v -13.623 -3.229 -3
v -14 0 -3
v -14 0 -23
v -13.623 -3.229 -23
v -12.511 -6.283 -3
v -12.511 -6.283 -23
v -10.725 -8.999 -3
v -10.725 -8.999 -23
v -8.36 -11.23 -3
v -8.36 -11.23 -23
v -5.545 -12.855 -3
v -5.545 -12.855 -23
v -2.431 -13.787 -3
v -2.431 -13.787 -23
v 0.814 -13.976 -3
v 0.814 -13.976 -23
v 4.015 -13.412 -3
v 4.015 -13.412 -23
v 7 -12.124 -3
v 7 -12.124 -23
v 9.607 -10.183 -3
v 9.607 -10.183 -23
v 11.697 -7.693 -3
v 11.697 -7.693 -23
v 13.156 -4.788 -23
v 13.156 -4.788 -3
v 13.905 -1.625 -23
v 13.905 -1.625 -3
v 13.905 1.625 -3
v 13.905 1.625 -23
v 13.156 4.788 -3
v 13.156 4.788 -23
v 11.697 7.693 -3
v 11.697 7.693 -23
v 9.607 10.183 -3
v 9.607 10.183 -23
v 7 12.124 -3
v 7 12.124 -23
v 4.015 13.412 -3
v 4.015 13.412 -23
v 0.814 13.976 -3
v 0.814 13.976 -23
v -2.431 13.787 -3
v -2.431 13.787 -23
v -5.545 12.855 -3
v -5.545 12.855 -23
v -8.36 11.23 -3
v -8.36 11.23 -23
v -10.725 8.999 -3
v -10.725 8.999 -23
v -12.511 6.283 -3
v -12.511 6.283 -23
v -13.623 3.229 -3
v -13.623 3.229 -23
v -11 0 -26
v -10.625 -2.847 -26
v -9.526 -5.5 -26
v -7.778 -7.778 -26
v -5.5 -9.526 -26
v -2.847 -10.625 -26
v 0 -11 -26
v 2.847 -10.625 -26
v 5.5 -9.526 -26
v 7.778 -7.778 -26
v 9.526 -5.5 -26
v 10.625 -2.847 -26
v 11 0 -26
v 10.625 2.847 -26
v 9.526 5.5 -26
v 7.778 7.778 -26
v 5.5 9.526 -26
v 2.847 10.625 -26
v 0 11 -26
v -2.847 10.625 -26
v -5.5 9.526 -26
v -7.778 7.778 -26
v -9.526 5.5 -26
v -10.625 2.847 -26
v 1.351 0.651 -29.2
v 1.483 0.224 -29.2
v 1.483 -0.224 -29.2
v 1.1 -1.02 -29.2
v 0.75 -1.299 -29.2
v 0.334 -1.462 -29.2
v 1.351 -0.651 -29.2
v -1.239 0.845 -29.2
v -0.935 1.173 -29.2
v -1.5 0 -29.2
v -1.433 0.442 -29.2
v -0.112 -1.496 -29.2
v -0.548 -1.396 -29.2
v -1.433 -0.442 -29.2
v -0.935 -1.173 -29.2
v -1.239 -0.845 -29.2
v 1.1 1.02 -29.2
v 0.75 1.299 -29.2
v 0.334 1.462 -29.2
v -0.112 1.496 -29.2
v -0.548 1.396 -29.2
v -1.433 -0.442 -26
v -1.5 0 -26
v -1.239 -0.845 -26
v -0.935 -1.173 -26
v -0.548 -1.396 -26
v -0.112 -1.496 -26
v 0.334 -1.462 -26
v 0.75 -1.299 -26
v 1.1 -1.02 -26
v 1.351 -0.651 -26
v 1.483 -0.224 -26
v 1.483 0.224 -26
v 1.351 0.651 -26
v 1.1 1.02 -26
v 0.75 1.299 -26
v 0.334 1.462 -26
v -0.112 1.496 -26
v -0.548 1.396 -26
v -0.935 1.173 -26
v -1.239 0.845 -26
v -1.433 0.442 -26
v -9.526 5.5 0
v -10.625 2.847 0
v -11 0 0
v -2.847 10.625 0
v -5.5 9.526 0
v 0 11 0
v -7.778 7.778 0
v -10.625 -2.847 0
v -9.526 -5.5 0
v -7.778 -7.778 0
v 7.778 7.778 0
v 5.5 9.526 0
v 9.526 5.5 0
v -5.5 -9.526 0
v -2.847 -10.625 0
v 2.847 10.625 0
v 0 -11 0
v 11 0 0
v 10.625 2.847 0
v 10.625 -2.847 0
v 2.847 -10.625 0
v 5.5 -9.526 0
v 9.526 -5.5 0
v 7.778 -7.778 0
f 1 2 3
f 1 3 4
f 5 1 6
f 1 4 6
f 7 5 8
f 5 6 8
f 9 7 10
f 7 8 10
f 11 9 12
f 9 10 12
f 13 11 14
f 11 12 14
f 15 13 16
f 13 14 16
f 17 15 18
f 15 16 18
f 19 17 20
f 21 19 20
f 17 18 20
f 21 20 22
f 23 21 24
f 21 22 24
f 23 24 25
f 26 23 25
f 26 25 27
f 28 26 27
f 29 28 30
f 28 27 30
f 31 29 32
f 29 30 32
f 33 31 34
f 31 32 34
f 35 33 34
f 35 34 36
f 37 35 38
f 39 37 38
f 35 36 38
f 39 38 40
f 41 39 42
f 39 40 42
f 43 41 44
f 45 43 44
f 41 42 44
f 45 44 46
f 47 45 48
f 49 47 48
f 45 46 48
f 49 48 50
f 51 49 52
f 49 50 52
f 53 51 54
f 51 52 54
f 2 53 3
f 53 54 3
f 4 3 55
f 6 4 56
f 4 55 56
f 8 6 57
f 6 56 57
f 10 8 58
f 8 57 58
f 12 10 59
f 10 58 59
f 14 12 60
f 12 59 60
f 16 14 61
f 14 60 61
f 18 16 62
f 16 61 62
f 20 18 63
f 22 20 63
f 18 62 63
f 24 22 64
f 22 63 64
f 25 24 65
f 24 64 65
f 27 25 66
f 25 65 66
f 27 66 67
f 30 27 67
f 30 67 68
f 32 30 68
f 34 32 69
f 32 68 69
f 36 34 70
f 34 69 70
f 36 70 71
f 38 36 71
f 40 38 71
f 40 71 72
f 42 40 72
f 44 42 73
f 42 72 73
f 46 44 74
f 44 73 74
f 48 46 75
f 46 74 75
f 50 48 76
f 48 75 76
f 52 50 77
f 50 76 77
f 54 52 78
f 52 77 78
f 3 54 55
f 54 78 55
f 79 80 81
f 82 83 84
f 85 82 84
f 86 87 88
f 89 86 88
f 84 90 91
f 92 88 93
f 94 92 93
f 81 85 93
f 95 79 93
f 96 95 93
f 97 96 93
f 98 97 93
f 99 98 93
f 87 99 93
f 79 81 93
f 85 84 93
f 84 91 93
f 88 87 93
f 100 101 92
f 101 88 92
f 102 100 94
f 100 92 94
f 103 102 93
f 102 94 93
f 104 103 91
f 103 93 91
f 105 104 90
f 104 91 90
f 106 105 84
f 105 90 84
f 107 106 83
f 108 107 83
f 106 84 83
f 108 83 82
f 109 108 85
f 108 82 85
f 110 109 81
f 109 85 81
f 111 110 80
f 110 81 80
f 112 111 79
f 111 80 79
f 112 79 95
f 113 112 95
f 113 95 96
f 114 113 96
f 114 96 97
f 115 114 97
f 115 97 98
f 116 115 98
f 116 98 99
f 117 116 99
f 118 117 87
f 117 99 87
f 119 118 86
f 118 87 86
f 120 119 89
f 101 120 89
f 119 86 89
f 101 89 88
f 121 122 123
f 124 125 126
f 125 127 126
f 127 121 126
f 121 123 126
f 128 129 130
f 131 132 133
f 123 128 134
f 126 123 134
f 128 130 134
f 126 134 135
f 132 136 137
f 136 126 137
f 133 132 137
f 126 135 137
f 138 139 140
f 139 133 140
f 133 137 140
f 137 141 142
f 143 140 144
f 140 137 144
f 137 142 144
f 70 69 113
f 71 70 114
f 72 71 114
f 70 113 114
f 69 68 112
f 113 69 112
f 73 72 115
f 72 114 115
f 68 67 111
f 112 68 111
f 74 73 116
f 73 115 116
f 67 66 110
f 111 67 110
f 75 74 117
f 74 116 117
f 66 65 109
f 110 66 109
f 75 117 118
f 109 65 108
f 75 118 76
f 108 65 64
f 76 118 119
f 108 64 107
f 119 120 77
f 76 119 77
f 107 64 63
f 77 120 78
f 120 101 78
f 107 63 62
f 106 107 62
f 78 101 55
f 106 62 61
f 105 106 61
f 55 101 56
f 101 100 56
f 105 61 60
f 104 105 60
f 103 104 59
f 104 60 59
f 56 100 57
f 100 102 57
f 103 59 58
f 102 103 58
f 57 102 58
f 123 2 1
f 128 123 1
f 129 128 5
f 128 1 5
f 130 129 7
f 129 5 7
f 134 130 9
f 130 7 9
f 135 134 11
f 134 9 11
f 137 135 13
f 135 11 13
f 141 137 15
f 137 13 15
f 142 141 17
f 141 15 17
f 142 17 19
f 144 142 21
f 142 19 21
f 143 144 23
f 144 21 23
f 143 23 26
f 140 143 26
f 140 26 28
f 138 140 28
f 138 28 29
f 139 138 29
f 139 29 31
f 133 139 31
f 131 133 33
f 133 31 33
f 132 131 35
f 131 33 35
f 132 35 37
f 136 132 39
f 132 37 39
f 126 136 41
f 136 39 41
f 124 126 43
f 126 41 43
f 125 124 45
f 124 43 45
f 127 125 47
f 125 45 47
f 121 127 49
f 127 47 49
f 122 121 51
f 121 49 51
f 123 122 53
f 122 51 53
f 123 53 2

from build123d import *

# Parameters (mm, degrees)
CHAMFER1_SIZE = 3


with BuildPart() as part:
    # Sketch1 → Revolve1 (revolve)
    with BuildSketch(Plane(origin=(0, 0, 0), x_dir=(1, 0, 0), z_dir=(0, 1, 0))):
        Polygon((0, 0), (-14, 0), (-14, 26), (-1.5, 26), (-1.5, 29.2), (0, 29.2), align=None)
    revolve(axis=Axis((0, 0, -29.2), (0, 0, 1)))

    # Chamfer1
    chamfer1_edges = [part.edges().sort_by_distance(p)[0] for p in [
        (14, 0, -26),
        (14, 0, 0),
    ]]
    chamfer(chamfer1_edges, length=CHAMFER1_SIZE)


solid = part.part
